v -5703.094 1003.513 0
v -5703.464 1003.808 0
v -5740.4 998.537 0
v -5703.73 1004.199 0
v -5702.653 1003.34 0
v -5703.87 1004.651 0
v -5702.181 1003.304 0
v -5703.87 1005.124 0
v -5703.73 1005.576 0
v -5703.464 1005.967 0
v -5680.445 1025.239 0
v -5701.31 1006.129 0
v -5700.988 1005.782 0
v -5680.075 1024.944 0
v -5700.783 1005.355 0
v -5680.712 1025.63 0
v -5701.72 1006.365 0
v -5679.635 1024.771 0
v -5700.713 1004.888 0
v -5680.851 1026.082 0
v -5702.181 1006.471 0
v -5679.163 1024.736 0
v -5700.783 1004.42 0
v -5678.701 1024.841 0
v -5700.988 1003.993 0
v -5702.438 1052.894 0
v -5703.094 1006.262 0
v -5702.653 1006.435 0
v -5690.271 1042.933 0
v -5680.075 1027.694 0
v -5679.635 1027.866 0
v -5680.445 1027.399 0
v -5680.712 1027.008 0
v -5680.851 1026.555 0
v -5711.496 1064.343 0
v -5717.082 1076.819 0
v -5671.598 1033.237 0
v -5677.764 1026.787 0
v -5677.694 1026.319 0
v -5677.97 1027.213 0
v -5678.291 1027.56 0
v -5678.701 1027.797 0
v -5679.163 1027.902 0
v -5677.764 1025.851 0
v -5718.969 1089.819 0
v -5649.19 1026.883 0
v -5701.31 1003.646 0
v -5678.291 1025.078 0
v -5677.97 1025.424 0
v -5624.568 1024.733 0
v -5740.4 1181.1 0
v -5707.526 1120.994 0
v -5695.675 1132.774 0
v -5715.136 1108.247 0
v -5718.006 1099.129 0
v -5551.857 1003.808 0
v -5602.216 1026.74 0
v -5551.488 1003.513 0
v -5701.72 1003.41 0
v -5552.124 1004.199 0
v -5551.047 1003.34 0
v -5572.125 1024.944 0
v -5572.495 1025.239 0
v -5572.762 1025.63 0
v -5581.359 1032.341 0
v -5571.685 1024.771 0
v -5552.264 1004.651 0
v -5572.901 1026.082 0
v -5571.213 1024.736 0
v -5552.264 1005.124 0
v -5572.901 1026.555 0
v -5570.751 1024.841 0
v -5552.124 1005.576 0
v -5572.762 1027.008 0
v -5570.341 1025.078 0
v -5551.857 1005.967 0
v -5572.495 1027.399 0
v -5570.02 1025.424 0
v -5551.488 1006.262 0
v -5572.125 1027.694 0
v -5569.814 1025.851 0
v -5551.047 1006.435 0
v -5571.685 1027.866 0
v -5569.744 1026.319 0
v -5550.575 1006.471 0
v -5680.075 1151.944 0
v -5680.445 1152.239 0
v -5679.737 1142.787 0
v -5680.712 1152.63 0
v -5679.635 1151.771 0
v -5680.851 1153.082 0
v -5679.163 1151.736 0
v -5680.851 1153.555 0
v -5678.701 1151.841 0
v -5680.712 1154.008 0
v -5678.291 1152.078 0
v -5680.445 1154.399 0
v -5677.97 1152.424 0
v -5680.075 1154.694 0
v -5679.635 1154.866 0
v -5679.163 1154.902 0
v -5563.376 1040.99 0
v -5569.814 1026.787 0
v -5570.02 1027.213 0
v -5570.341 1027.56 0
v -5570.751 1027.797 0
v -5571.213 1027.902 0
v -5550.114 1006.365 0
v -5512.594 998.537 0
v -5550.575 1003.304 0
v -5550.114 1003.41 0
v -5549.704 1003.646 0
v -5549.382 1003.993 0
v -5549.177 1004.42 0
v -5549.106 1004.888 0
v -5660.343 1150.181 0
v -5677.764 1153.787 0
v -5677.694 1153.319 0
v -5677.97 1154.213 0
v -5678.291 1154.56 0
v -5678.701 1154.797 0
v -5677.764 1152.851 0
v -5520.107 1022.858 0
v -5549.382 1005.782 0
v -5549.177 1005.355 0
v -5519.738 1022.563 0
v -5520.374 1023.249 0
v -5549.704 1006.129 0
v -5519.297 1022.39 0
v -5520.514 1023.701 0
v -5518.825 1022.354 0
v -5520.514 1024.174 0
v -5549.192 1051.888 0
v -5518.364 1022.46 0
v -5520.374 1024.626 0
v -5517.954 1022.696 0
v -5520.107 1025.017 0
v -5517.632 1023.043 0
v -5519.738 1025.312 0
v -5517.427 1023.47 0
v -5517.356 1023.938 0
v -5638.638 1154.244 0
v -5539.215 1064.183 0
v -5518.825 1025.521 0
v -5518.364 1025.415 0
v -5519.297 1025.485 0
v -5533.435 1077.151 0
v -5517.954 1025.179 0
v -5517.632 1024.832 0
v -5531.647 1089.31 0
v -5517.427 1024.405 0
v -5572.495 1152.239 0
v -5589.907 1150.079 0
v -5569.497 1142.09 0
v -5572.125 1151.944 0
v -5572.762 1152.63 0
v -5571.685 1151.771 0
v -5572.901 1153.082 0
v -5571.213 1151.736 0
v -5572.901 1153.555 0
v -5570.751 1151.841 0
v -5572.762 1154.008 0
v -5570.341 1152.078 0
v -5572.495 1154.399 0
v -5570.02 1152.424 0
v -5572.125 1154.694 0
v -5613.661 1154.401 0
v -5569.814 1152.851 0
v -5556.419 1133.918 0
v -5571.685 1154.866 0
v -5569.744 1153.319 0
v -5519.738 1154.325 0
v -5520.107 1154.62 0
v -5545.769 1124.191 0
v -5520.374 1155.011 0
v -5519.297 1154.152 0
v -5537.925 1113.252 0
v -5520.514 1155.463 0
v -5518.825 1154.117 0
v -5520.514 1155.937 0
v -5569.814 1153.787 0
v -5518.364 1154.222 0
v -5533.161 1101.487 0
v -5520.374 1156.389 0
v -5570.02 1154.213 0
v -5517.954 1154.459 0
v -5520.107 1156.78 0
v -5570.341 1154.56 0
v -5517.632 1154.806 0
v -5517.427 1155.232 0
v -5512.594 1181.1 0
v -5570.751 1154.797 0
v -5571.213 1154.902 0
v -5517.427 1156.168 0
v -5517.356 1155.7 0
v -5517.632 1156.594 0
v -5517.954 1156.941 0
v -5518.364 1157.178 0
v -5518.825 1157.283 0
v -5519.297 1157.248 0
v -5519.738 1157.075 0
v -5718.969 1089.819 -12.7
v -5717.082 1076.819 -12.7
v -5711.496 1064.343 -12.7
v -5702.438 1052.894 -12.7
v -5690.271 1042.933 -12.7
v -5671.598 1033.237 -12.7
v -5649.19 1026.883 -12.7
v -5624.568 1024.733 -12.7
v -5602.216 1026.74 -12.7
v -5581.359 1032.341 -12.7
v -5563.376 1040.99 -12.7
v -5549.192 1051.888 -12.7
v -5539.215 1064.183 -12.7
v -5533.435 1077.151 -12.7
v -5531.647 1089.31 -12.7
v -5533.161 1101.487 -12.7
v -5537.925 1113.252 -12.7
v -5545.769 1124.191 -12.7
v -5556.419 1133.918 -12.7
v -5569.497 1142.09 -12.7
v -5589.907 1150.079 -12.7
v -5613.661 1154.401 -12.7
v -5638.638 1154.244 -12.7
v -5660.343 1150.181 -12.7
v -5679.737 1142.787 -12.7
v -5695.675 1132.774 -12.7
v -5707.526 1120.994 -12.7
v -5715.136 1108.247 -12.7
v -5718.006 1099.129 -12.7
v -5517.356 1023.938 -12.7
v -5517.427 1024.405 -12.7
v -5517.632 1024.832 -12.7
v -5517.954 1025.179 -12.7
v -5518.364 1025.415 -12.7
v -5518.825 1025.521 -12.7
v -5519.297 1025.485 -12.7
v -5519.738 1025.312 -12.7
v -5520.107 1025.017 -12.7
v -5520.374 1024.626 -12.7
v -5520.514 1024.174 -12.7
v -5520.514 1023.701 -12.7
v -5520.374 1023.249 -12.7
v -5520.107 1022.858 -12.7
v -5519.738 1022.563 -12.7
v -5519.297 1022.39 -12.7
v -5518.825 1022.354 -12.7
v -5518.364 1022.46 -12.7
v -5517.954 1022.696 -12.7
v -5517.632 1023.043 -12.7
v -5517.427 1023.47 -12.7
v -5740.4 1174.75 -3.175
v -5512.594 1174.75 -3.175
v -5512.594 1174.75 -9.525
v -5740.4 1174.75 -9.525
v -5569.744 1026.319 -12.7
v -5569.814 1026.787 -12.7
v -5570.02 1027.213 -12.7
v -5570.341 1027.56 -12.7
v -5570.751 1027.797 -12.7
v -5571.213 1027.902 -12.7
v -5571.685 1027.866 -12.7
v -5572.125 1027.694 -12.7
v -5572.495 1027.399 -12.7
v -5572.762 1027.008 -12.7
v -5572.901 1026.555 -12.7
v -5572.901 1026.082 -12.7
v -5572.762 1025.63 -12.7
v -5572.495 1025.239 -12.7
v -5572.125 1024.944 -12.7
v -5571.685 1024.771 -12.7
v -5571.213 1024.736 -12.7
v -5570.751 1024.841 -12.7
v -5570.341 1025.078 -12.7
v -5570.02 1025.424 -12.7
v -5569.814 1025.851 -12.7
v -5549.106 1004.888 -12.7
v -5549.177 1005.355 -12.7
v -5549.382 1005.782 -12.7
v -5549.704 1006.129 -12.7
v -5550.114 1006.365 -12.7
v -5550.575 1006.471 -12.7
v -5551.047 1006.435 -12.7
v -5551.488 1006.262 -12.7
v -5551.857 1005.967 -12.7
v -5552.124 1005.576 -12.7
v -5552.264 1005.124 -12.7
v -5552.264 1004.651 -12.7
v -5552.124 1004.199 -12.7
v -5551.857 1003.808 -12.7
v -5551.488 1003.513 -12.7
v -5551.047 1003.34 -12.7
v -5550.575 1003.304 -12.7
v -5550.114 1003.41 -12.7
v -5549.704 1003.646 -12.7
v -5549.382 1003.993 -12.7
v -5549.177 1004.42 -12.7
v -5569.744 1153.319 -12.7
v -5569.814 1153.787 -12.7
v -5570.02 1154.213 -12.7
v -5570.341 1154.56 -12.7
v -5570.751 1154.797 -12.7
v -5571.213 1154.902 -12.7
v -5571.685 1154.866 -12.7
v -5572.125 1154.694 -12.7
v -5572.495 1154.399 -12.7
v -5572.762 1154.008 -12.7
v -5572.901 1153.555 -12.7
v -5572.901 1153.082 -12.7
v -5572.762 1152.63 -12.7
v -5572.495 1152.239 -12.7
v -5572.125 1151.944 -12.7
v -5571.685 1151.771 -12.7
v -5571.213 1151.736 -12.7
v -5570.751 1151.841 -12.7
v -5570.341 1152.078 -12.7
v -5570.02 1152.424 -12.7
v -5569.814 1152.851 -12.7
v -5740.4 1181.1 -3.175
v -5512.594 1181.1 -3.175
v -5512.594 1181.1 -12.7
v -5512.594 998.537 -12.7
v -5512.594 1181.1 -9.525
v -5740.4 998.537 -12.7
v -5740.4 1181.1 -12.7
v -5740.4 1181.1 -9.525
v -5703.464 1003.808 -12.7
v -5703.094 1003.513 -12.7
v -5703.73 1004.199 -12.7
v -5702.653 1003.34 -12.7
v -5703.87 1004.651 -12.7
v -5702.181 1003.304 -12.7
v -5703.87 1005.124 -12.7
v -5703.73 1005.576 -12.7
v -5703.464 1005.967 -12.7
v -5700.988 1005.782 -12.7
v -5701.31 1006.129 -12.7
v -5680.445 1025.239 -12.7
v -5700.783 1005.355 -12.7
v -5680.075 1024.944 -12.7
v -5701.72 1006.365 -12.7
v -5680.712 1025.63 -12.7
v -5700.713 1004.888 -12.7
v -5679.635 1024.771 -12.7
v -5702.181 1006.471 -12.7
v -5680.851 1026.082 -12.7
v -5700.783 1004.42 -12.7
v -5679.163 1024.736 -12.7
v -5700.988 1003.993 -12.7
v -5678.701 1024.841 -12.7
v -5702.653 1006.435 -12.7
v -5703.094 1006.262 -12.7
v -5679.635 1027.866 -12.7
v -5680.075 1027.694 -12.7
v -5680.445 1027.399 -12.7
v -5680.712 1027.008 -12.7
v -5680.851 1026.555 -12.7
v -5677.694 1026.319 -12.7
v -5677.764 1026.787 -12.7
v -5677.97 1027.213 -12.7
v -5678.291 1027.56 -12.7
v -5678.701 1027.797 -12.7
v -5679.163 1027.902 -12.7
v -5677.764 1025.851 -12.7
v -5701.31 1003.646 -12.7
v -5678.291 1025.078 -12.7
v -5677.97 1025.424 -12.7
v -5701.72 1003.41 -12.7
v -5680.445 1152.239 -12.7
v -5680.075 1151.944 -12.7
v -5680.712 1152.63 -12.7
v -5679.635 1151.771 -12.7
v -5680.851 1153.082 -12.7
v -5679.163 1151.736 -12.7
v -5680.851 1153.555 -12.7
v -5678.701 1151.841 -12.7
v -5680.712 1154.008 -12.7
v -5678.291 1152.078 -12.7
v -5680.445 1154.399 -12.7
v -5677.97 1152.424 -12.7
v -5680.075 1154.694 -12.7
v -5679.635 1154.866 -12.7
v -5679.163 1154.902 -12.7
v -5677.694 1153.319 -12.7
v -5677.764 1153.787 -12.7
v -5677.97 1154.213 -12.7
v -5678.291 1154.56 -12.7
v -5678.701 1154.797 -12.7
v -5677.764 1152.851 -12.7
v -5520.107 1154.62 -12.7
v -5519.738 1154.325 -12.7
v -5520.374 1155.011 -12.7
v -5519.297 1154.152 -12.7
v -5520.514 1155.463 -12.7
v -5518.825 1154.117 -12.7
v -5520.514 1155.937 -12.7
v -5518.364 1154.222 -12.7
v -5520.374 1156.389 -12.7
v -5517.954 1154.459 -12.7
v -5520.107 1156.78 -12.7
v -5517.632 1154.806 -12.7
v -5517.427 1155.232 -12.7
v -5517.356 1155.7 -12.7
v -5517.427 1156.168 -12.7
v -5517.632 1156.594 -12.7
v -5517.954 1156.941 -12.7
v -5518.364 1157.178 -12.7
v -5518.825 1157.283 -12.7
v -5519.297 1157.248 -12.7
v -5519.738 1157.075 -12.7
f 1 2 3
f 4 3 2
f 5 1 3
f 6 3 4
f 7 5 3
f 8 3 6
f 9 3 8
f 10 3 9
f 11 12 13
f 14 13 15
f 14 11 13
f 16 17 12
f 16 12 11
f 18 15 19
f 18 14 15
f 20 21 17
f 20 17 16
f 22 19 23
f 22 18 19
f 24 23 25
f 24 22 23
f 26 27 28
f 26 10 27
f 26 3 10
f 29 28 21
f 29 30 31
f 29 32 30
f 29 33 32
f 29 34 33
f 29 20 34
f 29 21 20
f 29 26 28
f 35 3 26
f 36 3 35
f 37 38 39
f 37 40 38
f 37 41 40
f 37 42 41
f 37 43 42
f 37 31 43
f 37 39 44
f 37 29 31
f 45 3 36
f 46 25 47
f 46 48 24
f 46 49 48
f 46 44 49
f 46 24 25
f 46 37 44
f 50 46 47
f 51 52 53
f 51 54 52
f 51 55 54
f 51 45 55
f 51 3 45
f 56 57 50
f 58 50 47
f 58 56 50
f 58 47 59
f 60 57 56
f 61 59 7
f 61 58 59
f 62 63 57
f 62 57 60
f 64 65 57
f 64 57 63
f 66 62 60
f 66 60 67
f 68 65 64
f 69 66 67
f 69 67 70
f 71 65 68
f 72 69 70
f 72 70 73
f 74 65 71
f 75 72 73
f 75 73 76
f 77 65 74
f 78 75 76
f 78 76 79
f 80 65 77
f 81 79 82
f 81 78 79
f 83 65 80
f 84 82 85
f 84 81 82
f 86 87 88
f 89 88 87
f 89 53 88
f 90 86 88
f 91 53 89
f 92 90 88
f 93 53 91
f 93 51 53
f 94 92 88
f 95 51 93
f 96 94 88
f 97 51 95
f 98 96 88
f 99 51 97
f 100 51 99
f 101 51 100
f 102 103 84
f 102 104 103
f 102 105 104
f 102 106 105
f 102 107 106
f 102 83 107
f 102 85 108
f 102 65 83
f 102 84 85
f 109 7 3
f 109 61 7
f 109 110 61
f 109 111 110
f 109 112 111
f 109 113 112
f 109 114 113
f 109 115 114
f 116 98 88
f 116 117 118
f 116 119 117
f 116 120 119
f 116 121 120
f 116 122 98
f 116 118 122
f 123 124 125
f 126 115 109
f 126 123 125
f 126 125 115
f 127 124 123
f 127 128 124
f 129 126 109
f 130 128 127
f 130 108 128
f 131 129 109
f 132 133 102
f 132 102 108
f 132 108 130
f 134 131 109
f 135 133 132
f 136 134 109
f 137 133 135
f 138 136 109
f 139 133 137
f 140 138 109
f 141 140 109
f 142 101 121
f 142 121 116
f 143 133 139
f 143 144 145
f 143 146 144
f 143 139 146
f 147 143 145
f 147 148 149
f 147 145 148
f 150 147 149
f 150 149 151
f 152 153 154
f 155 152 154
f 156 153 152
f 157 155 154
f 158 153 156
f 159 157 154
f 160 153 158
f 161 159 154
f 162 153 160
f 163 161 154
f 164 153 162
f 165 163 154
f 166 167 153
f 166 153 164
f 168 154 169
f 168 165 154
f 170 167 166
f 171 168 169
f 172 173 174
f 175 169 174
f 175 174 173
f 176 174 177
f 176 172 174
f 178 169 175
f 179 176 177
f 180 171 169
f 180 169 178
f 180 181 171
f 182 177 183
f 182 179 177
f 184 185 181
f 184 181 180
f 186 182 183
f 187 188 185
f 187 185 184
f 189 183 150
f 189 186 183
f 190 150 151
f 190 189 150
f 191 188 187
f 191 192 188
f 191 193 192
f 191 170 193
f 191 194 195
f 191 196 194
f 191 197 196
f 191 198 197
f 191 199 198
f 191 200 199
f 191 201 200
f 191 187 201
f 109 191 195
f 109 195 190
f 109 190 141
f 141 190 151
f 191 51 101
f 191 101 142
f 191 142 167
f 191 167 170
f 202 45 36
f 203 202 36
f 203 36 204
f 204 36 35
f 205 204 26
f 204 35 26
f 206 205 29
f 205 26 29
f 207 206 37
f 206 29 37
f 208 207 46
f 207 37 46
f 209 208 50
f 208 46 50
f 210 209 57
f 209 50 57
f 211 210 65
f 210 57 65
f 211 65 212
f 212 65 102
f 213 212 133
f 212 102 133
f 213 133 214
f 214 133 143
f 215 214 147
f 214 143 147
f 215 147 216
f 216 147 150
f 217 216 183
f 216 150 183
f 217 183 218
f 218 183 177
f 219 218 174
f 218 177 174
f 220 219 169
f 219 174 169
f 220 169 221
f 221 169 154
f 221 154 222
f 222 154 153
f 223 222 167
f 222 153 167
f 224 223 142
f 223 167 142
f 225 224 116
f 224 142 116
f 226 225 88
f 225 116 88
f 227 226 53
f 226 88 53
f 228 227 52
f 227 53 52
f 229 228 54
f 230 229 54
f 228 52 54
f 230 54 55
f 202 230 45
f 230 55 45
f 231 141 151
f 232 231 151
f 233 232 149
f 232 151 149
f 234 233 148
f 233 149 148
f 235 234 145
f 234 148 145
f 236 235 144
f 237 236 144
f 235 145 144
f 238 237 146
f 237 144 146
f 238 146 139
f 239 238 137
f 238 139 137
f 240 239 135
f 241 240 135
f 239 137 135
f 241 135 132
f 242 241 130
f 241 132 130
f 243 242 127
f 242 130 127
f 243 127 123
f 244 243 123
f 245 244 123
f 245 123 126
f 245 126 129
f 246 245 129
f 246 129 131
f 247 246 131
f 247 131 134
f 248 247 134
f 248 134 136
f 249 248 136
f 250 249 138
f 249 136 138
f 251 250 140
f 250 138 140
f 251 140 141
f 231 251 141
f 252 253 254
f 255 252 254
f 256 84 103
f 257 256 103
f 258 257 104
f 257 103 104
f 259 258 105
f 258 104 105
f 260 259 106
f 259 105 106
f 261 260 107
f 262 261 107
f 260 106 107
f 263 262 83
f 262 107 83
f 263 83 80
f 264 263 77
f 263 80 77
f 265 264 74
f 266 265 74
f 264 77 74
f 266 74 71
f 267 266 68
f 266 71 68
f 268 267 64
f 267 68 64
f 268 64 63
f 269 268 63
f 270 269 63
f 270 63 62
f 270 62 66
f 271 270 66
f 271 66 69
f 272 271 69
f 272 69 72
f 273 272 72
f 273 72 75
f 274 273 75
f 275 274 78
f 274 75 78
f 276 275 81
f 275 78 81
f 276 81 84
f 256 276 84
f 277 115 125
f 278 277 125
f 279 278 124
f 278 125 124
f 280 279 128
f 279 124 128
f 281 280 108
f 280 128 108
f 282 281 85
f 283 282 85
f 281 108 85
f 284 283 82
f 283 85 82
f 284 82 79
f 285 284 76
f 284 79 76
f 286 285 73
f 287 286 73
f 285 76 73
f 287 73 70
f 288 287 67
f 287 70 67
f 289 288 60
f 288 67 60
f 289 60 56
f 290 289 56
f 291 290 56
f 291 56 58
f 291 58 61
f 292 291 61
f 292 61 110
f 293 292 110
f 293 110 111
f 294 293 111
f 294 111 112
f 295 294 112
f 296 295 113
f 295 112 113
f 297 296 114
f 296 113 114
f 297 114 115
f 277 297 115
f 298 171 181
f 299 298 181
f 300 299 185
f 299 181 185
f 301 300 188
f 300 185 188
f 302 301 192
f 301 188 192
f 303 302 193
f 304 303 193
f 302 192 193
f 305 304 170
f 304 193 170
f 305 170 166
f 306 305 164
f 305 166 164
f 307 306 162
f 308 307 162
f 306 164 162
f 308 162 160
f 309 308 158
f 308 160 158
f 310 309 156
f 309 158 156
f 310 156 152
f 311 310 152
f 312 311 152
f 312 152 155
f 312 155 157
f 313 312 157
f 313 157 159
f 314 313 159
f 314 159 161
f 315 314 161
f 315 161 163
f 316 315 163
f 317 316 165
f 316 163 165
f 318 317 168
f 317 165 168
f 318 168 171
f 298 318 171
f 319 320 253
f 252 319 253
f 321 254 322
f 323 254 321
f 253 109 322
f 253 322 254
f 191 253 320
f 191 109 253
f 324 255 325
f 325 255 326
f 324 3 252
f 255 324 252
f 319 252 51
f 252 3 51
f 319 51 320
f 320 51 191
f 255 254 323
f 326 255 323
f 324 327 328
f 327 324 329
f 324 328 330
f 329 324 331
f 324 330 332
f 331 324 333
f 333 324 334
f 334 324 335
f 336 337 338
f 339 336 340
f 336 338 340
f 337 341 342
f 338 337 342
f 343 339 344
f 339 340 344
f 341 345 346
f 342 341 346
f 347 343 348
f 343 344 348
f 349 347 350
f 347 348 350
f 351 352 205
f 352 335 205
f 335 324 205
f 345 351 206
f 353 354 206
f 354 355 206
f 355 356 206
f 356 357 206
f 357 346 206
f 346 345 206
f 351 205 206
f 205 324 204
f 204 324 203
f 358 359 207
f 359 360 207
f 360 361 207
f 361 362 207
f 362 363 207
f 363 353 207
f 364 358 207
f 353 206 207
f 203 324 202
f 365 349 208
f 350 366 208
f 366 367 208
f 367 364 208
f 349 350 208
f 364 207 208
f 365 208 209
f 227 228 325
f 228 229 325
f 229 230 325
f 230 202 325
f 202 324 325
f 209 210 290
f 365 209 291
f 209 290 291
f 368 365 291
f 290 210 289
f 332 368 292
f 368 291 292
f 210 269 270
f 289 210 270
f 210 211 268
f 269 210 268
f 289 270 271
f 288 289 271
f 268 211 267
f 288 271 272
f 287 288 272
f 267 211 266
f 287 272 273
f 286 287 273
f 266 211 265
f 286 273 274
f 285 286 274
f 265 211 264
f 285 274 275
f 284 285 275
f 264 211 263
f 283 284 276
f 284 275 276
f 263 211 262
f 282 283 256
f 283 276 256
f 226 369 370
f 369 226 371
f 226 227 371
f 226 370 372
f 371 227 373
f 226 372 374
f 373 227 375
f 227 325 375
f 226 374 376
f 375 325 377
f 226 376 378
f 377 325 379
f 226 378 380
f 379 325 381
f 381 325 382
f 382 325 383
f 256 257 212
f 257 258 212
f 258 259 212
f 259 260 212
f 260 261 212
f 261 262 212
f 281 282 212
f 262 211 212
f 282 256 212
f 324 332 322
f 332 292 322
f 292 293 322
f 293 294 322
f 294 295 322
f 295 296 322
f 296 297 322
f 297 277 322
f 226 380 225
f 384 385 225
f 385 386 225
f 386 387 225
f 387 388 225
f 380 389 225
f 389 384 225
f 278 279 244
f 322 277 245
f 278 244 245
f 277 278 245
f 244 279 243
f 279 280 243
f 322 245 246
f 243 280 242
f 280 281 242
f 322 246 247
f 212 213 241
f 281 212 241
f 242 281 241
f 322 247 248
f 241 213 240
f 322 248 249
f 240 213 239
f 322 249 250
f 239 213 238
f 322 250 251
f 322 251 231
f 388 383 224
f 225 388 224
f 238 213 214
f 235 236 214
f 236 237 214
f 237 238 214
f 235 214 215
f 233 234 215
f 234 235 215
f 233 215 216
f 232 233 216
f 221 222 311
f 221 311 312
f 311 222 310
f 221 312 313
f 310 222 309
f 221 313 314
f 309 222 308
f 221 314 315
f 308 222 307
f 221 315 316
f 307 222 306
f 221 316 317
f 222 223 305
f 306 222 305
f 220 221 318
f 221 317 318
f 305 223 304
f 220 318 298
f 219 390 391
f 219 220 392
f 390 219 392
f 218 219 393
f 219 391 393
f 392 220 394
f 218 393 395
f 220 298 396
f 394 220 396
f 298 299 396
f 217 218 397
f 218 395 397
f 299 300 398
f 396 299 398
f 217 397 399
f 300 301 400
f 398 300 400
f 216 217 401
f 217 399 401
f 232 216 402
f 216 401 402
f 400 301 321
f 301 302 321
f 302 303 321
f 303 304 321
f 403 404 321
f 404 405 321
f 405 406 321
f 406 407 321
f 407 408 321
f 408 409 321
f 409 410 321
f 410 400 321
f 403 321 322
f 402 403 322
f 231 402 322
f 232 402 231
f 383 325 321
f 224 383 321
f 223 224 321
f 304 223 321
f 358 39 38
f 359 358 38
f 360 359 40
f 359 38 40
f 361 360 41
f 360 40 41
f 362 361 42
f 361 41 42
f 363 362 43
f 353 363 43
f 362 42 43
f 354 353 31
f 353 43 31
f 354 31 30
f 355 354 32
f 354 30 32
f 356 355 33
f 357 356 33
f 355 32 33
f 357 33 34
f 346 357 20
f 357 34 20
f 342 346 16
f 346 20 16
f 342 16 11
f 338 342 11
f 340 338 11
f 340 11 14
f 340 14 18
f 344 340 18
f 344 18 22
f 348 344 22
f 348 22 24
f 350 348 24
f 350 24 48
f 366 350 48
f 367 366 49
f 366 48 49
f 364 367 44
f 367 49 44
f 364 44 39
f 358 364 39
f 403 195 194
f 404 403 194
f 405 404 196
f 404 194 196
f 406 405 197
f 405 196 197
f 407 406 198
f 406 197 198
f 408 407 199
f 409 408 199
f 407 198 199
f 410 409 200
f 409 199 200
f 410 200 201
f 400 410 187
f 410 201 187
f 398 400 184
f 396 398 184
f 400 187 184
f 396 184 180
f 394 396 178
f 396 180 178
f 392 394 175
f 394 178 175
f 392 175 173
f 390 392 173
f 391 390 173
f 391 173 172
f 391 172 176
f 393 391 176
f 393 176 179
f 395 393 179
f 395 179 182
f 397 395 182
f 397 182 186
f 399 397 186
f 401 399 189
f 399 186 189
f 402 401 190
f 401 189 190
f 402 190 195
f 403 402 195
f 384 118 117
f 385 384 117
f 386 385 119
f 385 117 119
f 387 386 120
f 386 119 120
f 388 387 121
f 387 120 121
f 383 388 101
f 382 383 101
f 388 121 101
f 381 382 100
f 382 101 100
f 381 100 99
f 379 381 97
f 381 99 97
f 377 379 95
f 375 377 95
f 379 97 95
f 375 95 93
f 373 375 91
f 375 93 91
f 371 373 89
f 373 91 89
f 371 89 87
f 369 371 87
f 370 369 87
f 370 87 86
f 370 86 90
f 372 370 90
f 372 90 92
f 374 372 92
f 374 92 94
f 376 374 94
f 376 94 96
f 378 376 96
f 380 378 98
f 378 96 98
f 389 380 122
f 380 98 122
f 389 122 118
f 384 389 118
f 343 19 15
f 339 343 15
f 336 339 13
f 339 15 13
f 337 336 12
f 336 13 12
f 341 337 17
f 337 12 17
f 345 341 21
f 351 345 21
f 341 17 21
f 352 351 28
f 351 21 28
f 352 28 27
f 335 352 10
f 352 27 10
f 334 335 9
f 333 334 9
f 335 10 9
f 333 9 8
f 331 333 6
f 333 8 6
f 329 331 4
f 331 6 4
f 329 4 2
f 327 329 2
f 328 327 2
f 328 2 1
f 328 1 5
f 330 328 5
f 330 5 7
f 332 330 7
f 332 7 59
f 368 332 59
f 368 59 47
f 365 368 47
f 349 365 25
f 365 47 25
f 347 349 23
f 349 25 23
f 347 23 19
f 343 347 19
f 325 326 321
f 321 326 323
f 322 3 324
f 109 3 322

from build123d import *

# Parameters (mm, degrees)
SKETCH2_W          = 227.80625
SKETCH2_H          = 182.5625
EXTRUDE1_DEPTH     = 12.7
SKETCH4_R          = 1.5875
SKETCH4_RX         = 93.6625
SKETCH4_RY         = 65.087499997
CUT_EXTRUDE1_DEPTH = 12.7
CUT_EXTRUDE2_DEPTH = 227.80625


with BuildPart() as part:
    # Sketch2 → Extrude1 (new body)
    with BuildSketch(Plane.XY):
        with Locations((-5626.496875, 1089.81875)):
            Rectangle(SKETCH2_W, SKETCH2_H)
    extrude(amount=-EXTRUDE1_DEPTH)

    # Sketch4 → Cut-Extrude1 (cut)
    with BuildSketch(Plane.XY):
        with Locations((-5571.33125, 1153.31875)):
            Circle(SKETCH4_R)
        with Locations((-5518.94375, 1155.7)):
            Circle(SKETCH4_R)
        with Locations((-5518.94375, 1023.9375)):
            Circle(SKETCH4_R)
        with Locations((-5550.69375, 1004.8875)):
            Circle(SKETCH4_R)
        with Locations((-5571.33125, 1026.31875)):
            Circle(SKETCH4_R)
        with Locations((-5679.28125, 1026.31875)):
            Circle(SKETCH4_R)
        with Locations((-5702.3, 1004.8875)):
            Circle(SKETCH4_R)
        with Locations((-5679.28125, 1153.31875)):
            Circle(SKETCH4_R)
        with Locations(Location((-5625.30625, 1089.81875), (0, 0, 180))):
            Ellipse(SKETCH4_RX, SKETCH4_RY)
    extrude(amount=-CUT_EXTRUDE1_DEPTH, mode=Mode.SUBTRACT)

    # Sketch5 → Cut-Extrude2 (cut)
    with BuildSketch(Plane(origin=(-5512.59375, 0, 0), x_dir=(0, 0, -1), z_dir=(1, 0, 0))):
        Polygon((6.35, 1181.1), (3.175, 1181.1), (3.175, 1174.75), (9.525, 1174.75), (9.525, 1181.1), align=None)
    extrude(amount=-CUT_EXTRUDE2_DEPTH, mode=Mode.SUBTRACT)


solid = part.part
